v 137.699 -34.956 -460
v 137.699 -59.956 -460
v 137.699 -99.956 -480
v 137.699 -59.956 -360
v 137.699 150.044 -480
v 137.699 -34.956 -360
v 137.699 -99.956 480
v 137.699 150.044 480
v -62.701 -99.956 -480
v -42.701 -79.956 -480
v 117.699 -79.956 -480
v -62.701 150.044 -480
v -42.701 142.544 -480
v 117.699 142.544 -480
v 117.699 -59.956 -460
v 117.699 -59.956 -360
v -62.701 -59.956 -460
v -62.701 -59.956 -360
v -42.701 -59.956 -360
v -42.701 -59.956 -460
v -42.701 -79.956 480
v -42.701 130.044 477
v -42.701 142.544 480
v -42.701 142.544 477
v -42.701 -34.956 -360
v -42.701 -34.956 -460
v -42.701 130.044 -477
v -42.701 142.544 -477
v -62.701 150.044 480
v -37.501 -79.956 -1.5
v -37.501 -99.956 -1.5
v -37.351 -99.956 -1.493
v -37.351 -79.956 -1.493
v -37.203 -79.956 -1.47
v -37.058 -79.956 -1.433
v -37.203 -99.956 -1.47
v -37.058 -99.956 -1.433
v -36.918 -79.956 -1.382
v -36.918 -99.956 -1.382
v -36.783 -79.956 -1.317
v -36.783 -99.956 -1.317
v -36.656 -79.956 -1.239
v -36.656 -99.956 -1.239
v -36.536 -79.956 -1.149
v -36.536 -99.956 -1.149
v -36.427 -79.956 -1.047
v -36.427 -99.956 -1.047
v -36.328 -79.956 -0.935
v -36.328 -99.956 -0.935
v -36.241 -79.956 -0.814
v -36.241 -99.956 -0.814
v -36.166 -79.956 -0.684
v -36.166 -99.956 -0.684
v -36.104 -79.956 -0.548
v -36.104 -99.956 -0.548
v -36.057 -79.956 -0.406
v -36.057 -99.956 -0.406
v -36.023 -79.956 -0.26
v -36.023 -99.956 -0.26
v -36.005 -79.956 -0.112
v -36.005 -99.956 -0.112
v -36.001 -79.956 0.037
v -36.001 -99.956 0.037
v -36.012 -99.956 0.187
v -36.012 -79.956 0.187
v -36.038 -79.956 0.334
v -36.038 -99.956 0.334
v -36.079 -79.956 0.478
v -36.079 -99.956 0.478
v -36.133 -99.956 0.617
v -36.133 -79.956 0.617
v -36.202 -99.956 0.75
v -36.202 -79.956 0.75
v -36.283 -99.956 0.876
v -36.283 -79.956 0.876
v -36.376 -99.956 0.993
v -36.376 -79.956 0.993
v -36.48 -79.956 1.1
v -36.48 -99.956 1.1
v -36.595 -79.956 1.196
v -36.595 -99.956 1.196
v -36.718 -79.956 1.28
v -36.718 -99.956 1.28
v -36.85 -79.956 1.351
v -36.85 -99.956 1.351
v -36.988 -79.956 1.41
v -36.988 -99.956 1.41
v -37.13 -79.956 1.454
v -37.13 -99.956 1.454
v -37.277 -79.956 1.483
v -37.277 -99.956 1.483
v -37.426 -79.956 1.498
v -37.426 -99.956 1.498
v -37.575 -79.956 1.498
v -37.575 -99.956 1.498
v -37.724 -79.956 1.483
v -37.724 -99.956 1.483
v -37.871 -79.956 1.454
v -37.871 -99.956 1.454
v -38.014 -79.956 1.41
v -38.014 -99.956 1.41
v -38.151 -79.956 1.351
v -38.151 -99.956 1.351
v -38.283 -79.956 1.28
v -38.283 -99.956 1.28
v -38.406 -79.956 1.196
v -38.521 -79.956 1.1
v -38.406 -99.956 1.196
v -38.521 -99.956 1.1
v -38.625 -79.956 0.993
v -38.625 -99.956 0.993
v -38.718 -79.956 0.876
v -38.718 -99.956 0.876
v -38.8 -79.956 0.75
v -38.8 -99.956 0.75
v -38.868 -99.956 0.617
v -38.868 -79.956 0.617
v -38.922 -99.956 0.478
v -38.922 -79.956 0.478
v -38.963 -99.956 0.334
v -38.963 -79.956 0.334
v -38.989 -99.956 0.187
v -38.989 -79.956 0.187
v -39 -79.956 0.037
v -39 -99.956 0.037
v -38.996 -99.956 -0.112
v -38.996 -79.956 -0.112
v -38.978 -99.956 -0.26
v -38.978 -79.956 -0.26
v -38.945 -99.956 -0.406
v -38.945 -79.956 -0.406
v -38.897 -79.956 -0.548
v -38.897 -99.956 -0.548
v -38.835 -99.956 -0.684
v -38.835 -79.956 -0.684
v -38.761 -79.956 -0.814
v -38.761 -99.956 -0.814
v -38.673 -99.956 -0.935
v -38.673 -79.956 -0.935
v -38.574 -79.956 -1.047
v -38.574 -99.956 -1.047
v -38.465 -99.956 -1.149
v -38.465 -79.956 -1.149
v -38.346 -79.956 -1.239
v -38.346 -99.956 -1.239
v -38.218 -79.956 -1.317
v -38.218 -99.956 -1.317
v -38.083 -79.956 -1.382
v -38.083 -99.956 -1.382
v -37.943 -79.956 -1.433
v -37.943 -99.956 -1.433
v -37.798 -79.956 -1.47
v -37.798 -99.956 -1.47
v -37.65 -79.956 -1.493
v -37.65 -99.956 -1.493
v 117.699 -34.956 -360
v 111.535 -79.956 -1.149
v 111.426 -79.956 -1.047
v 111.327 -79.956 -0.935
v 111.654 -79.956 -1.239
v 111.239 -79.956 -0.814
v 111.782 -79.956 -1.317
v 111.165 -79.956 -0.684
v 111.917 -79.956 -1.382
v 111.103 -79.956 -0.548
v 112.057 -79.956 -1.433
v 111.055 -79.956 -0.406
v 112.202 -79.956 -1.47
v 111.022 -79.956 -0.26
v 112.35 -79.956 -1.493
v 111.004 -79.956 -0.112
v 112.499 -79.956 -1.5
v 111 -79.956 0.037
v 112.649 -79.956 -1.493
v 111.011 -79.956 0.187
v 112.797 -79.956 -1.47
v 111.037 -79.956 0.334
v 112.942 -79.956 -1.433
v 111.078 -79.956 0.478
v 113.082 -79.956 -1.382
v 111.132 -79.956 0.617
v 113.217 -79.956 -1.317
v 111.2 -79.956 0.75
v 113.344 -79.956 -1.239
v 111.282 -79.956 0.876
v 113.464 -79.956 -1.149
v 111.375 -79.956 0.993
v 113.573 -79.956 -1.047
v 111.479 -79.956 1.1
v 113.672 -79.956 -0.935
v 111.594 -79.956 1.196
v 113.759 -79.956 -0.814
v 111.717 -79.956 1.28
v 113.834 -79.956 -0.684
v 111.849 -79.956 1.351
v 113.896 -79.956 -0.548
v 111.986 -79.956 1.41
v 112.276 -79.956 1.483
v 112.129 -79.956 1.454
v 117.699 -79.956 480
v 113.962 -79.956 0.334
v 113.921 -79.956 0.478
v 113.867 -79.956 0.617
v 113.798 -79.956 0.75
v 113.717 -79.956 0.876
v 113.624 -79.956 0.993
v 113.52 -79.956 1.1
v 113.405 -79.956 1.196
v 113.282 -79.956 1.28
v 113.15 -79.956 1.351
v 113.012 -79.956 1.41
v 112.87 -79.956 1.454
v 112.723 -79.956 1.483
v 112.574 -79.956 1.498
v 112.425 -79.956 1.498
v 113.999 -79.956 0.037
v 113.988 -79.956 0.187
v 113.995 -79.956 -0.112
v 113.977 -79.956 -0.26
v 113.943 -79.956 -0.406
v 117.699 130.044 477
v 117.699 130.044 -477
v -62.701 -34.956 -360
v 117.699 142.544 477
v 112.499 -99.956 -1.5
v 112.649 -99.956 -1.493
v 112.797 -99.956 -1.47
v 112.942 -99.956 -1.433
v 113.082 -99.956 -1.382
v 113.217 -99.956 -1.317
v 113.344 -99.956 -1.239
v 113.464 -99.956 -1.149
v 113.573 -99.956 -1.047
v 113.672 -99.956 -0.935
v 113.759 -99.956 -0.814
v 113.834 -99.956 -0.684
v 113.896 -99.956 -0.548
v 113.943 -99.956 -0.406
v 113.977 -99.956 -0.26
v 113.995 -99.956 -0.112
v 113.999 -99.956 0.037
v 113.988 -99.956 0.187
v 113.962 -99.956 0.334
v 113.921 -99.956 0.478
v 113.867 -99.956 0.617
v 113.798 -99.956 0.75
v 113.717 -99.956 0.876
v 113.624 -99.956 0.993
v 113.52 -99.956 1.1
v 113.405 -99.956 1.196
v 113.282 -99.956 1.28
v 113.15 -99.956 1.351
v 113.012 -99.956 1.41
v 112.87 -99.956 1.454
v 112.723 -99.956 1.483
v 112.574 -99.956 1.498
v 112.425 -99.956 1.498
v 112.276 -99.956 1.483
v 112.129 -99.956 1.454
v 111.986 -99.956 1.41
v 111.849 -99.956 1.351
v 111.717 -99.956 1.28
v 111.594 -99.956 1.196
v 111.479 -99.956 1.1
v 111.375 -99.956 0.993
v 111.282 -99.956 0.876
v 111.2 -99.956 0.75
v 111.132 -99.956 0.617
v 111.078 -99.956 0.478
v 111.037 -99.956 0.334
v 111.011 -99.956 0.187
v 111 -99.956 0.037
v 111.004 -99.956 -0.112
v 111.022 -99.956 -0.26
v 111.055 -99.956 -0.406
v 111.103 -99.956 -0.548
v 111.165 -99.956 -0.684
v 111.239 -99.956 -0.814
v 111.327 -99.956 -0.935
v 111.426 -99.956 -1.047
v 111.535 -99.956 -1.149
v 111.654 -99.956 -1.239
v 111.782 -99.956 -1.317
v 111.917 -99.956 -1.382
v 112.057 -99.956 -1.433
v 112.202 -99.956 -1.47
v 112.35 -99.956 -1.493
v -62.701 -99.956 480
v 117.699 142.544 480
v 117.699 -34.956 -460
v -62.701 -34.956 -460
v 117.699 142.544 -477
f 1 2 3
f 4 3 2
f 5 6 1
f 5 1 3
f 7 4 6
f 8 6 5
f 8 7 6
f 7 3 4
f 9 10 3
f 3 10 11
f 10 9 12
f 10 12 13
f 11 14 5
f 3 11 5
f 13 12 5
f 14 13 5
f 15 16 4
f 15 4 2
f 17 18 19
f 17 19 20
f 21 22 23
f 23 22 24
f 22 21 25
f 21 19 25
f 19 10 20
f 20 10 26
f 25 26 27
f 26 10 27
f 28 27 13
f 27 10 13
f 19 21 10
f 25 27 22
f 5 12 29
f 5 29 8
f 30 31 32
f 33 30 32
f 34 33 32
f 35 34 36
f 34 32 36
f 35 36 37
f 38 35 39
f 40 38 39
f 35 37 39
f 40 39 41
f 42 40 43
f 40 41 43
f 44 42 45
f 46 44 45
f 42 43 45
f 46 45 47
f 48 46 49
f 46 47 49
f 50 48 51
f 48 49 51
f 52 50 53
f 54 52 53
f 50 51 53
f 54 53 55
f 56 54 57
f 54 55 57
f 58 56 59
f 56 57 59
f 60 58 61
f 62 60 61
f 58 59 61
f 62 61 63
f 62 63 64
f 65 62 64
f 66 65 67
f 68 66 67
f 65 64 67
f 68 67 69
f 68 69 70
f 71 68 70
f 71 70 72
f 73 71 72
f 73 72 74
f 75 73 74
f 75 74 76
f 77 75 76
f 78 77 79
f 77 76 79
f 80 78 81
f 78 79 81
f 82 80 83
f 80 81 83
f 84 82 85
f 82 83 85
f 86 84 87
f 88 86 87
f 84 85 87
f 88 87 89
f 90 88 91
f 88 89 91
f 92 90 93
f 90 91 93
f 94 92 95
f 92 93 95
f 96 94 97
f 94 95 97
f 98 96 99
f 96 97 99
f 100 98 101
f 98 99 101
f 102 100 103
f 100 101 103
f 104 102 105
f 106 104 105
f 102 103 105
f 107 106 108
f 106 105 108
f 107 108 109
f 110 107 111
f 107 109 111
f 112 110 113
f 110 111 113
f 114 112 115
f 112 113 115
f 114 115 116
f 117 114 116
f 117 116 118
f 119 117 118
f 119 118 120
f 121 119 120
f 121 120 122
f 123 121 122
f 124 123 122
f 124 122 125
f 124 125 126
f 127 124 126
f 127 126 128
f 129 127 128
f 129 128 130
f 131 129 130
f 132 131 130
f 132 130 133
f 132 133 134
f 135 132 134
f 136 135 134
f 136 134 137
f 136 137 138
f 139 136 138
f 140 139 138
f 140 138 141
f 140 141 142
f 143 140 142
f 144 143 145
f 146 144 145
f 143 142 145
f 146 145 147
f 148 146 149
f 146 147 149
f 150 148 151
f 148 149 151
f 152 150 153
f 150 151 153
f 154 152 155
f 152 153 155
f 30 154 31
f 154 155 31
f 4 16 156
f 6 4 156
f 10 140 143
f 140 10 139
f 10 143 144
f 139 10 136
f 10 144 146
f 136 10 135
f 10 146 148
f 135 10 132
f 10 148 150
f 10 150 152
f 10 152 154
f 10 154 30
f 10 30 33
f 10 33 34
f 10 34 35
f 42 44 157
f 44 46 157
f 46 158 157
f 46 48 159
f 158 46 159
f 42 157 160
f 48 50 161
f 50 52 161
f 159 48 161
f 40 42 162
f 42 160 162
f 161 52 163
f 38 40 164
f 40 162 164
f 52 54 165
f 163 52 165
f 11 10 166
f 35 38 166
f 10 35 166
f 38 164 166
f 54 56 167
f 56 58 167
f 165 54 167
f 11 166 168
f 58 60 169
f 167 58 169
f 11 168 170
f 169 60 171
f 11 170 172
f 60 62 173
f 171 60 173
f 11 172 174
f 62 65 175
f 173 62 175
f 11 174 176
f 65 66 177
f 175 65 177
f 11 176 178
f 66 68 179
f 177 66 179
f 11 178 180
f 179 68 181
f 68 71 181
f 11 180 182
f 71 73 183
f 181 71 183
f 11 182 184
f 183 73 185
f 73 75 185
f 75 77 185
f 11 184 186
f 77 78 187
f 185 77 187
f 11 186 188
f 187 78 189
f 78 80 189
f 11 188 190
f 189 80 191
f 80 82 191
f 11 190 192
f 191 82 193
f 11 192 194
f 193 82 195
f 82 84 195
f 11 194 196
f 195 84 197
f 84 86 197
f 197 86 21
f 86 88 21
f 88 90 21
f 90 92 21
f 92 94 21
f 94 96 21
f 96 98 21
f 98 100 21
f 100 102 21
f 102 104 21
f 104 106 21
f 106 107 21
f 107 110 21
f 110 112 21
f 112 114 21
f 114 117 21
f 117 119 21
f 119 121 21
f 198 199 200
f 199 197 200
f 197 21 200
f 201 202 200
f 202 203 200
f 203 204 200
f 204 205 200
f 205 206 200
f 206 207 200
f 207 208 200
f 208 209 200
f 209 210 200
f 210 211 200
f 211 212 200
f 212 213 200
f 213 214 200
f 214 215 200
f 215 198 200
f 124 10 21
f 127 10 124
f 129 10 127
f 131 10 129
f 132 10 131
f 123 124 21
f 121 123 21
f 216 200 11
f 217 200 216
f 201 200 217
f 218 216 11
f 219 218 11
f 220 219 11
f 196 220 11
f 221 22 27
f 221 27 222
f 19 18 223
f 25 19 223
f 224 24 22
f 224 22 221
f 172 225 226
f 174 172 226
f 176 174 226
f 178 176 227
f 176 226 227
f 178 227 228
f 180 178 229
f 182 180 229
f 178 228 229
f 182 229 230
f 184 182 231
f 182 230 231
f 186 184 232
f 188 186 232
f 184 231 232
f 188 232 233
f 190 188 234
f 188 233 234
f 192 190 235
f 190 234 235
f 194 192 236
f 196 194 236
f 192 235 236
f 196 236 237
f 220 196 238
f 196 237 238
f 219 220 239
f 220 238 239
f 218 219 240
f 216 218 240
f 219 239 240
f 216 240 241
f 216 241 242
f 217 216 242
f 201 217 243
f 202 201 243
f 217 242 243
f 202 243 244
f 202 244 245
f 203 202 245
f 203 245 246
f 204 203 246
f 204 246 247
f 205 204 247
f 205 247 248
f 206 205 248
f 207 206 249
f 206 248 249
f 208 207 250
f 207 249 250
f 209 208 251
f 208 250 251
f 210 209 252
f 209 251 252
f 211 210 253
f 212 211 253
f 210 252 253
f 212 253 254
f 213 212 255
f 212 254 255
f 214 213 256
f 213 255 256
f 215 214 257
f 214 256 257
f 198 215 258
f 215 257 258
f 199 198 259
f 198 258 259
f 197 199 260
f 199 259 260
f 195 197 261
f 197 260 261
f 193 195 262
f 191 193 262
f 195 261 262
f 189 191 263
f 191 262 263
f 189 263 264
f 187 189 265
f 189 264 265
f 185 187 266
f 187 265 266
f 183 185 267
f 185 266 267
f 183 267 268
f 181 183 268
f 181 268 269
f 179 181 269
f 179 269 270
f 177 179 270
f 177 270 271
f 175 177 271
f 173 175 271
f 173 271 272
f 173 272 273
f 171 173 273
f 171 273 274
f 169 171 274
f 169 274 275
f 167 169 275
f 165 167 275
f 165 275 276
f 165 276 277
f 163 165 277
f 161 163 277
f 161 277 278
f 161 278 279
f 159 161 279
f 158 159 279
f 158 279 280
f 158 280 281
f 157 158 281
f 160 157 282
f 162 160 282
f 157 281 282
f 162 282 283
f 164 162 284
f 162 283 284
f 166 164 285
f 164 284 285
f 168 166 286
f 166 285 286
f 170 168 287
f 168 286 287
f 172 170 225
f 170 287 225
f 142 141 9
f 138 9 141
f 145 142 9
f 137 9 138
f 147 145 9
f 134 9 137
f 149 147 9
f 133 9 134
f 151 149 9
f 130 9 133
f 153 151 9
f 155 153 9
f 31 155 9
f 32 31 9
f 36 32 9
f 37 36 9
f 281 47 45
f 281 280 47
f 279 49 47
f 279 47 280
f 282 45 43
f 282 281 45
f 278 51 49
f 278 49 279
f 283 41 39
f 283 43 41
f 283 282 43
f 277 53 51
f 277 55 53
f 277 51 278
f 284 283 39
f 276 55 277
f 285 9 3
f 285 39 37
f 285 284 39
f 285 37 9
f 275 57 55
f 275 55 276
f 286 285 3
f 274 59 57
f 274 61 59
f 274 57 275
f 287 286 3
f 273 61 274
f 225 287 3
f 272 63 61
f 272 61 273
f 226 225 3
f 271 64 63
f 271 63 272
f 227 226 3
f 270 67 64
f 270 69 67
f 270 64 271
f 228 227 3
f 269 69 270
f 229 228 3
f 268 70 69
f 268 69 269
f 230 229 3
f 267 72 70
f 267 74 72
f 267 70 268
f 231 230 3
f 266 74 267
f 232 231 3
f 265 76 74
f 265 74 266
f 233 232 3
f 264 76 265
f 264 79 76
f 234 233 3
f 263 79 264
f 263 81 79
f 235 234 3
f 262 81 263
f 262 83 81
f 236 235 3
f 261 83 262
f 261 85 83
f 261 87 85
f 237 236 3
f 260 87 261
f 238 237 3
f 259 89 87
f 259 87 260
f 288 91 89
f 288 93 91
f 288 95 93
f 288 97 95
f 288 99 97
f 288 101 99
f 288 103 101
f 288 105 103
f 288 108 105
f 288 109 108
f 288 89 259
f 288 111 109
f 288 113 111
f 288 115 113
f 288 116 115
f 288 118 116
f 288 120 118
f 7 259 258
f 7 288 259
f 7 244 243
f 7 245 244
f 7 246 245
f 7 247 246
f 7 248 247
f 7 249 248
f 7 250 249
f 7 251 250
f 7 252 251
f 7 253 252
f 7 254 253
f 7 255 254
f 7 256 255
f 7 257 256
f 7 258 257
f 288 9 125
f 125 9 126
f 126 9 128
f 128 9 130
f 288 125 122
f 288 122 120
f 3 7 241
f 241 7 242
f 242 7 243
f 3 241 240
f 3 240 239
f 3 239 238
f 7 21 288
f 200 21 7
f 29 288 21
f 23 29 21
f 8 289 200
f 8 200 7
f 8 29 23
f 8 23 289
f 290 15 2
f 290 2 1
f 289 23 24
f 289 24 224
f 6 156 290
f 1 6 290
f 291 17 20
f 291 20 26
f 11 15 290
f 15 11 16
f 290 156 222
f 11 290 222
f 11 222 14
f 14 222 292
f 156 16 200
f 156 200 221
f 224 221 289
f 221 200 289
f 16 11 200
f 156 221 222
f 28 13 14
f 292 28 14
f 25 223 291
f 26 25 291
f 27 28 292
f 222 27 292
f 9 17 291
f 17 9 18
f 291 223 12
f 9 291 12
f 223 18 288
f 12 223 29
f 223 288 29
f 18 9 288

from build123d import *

# Parameters (mm, degrees)
SKETCH2_W               = 200.4
SKETCH2_H               = 250
SKETCH2_W_2             = 160.4
SKETCH2_H_2             = 210
BOSS_EXTRUDE1_DEPTH     = 480
SKETCH3_W               = 160.4
SKETCH3_H               = 25
CUT_EXTRUDE1_DEPTH      = 3
CUT_EXTRUDE2_DEPTH      = 535.282171956
CUT_EXTRUDE2_DEPTH_BACK = 535.282171956
SKETCH4_W               = 100
SKETCH4_H               = 25
SKETCH7_R               = 1.5
CUT_EXTRUDE4_DEPTH      = 20


with BuildPart() as part:
    # Sketch2 → Boss-Extrude1 (new, symmetric)
    with BuildSketch(Plane.XY):
        with Locations((37.499423299, 25.044257703)):
            Rectangle(SKETCH2_W, SKETCH2_H)
        with Locations((37.499423299, 25.044257703)):
            Rectangle(SKETCH2_W_2, SKETCH2_H_2, mode=Mode.SUBTRACT)
    extrude(amount=BOSS_EXTRUDE1_DEPTH, both=True)

    # Sketch3 → Cut-Extrude1 (cut)
    with BuildSketch(Plane.XY.offset(480)):
        with Locations((37.499423299, 130.044257703)):
            Rectangle(SKETCH3_W, SKETCH3_H)
    cut_extrude1 = extrude(amount=-CUT_EXTRUDE1_DEPTH, mode=Mode.SUBTRACT)

    # Mirror1: Cut-Extrude1 across plane
    add(cut_extrude1.mirror(Plane.XY), mode=Mode.SUBTRACT)

    # Sketch4 → Cut-Extrude2 (cut, two sides: drawn at the far end of the back side and taken through both)
    with BuildSketch(Plane(origin=(-42.700576701, 0, 0), x_dir=(0, 0, -1), z_dir=(1, 0, 0)).offset(-CUT_EXTRUDE2_DEPTH_BACK)):
        with Locations((410, -47.455742297)):
            Rectangle(SKETCH4_W, SKETCH4_H)
    extrude(amount=CUT_EXTRUDE2_DEPTH + CUT_EXTRUDE2_DEPTH_BACK, mode=Mode.SUBTRACT)

    # Sketch7 → Cut-Extrude4 (cut)
    with BuildSketch(Plane.XZ.offset(99.955742297)):
        with Locations(Location((112.499423299, 0, 0), (0, 0, 270))):
            Circle(SKETCH7_R)
        with Locations(Location((-37.500576701, 0, 0), (0, 0, 270))):
            Circle(SKETCH7_R)
    extrude(amount=-CUT_EXTRUDE4_DEPTH, mode=Mode.SUBTRACT)


solid = part.part
